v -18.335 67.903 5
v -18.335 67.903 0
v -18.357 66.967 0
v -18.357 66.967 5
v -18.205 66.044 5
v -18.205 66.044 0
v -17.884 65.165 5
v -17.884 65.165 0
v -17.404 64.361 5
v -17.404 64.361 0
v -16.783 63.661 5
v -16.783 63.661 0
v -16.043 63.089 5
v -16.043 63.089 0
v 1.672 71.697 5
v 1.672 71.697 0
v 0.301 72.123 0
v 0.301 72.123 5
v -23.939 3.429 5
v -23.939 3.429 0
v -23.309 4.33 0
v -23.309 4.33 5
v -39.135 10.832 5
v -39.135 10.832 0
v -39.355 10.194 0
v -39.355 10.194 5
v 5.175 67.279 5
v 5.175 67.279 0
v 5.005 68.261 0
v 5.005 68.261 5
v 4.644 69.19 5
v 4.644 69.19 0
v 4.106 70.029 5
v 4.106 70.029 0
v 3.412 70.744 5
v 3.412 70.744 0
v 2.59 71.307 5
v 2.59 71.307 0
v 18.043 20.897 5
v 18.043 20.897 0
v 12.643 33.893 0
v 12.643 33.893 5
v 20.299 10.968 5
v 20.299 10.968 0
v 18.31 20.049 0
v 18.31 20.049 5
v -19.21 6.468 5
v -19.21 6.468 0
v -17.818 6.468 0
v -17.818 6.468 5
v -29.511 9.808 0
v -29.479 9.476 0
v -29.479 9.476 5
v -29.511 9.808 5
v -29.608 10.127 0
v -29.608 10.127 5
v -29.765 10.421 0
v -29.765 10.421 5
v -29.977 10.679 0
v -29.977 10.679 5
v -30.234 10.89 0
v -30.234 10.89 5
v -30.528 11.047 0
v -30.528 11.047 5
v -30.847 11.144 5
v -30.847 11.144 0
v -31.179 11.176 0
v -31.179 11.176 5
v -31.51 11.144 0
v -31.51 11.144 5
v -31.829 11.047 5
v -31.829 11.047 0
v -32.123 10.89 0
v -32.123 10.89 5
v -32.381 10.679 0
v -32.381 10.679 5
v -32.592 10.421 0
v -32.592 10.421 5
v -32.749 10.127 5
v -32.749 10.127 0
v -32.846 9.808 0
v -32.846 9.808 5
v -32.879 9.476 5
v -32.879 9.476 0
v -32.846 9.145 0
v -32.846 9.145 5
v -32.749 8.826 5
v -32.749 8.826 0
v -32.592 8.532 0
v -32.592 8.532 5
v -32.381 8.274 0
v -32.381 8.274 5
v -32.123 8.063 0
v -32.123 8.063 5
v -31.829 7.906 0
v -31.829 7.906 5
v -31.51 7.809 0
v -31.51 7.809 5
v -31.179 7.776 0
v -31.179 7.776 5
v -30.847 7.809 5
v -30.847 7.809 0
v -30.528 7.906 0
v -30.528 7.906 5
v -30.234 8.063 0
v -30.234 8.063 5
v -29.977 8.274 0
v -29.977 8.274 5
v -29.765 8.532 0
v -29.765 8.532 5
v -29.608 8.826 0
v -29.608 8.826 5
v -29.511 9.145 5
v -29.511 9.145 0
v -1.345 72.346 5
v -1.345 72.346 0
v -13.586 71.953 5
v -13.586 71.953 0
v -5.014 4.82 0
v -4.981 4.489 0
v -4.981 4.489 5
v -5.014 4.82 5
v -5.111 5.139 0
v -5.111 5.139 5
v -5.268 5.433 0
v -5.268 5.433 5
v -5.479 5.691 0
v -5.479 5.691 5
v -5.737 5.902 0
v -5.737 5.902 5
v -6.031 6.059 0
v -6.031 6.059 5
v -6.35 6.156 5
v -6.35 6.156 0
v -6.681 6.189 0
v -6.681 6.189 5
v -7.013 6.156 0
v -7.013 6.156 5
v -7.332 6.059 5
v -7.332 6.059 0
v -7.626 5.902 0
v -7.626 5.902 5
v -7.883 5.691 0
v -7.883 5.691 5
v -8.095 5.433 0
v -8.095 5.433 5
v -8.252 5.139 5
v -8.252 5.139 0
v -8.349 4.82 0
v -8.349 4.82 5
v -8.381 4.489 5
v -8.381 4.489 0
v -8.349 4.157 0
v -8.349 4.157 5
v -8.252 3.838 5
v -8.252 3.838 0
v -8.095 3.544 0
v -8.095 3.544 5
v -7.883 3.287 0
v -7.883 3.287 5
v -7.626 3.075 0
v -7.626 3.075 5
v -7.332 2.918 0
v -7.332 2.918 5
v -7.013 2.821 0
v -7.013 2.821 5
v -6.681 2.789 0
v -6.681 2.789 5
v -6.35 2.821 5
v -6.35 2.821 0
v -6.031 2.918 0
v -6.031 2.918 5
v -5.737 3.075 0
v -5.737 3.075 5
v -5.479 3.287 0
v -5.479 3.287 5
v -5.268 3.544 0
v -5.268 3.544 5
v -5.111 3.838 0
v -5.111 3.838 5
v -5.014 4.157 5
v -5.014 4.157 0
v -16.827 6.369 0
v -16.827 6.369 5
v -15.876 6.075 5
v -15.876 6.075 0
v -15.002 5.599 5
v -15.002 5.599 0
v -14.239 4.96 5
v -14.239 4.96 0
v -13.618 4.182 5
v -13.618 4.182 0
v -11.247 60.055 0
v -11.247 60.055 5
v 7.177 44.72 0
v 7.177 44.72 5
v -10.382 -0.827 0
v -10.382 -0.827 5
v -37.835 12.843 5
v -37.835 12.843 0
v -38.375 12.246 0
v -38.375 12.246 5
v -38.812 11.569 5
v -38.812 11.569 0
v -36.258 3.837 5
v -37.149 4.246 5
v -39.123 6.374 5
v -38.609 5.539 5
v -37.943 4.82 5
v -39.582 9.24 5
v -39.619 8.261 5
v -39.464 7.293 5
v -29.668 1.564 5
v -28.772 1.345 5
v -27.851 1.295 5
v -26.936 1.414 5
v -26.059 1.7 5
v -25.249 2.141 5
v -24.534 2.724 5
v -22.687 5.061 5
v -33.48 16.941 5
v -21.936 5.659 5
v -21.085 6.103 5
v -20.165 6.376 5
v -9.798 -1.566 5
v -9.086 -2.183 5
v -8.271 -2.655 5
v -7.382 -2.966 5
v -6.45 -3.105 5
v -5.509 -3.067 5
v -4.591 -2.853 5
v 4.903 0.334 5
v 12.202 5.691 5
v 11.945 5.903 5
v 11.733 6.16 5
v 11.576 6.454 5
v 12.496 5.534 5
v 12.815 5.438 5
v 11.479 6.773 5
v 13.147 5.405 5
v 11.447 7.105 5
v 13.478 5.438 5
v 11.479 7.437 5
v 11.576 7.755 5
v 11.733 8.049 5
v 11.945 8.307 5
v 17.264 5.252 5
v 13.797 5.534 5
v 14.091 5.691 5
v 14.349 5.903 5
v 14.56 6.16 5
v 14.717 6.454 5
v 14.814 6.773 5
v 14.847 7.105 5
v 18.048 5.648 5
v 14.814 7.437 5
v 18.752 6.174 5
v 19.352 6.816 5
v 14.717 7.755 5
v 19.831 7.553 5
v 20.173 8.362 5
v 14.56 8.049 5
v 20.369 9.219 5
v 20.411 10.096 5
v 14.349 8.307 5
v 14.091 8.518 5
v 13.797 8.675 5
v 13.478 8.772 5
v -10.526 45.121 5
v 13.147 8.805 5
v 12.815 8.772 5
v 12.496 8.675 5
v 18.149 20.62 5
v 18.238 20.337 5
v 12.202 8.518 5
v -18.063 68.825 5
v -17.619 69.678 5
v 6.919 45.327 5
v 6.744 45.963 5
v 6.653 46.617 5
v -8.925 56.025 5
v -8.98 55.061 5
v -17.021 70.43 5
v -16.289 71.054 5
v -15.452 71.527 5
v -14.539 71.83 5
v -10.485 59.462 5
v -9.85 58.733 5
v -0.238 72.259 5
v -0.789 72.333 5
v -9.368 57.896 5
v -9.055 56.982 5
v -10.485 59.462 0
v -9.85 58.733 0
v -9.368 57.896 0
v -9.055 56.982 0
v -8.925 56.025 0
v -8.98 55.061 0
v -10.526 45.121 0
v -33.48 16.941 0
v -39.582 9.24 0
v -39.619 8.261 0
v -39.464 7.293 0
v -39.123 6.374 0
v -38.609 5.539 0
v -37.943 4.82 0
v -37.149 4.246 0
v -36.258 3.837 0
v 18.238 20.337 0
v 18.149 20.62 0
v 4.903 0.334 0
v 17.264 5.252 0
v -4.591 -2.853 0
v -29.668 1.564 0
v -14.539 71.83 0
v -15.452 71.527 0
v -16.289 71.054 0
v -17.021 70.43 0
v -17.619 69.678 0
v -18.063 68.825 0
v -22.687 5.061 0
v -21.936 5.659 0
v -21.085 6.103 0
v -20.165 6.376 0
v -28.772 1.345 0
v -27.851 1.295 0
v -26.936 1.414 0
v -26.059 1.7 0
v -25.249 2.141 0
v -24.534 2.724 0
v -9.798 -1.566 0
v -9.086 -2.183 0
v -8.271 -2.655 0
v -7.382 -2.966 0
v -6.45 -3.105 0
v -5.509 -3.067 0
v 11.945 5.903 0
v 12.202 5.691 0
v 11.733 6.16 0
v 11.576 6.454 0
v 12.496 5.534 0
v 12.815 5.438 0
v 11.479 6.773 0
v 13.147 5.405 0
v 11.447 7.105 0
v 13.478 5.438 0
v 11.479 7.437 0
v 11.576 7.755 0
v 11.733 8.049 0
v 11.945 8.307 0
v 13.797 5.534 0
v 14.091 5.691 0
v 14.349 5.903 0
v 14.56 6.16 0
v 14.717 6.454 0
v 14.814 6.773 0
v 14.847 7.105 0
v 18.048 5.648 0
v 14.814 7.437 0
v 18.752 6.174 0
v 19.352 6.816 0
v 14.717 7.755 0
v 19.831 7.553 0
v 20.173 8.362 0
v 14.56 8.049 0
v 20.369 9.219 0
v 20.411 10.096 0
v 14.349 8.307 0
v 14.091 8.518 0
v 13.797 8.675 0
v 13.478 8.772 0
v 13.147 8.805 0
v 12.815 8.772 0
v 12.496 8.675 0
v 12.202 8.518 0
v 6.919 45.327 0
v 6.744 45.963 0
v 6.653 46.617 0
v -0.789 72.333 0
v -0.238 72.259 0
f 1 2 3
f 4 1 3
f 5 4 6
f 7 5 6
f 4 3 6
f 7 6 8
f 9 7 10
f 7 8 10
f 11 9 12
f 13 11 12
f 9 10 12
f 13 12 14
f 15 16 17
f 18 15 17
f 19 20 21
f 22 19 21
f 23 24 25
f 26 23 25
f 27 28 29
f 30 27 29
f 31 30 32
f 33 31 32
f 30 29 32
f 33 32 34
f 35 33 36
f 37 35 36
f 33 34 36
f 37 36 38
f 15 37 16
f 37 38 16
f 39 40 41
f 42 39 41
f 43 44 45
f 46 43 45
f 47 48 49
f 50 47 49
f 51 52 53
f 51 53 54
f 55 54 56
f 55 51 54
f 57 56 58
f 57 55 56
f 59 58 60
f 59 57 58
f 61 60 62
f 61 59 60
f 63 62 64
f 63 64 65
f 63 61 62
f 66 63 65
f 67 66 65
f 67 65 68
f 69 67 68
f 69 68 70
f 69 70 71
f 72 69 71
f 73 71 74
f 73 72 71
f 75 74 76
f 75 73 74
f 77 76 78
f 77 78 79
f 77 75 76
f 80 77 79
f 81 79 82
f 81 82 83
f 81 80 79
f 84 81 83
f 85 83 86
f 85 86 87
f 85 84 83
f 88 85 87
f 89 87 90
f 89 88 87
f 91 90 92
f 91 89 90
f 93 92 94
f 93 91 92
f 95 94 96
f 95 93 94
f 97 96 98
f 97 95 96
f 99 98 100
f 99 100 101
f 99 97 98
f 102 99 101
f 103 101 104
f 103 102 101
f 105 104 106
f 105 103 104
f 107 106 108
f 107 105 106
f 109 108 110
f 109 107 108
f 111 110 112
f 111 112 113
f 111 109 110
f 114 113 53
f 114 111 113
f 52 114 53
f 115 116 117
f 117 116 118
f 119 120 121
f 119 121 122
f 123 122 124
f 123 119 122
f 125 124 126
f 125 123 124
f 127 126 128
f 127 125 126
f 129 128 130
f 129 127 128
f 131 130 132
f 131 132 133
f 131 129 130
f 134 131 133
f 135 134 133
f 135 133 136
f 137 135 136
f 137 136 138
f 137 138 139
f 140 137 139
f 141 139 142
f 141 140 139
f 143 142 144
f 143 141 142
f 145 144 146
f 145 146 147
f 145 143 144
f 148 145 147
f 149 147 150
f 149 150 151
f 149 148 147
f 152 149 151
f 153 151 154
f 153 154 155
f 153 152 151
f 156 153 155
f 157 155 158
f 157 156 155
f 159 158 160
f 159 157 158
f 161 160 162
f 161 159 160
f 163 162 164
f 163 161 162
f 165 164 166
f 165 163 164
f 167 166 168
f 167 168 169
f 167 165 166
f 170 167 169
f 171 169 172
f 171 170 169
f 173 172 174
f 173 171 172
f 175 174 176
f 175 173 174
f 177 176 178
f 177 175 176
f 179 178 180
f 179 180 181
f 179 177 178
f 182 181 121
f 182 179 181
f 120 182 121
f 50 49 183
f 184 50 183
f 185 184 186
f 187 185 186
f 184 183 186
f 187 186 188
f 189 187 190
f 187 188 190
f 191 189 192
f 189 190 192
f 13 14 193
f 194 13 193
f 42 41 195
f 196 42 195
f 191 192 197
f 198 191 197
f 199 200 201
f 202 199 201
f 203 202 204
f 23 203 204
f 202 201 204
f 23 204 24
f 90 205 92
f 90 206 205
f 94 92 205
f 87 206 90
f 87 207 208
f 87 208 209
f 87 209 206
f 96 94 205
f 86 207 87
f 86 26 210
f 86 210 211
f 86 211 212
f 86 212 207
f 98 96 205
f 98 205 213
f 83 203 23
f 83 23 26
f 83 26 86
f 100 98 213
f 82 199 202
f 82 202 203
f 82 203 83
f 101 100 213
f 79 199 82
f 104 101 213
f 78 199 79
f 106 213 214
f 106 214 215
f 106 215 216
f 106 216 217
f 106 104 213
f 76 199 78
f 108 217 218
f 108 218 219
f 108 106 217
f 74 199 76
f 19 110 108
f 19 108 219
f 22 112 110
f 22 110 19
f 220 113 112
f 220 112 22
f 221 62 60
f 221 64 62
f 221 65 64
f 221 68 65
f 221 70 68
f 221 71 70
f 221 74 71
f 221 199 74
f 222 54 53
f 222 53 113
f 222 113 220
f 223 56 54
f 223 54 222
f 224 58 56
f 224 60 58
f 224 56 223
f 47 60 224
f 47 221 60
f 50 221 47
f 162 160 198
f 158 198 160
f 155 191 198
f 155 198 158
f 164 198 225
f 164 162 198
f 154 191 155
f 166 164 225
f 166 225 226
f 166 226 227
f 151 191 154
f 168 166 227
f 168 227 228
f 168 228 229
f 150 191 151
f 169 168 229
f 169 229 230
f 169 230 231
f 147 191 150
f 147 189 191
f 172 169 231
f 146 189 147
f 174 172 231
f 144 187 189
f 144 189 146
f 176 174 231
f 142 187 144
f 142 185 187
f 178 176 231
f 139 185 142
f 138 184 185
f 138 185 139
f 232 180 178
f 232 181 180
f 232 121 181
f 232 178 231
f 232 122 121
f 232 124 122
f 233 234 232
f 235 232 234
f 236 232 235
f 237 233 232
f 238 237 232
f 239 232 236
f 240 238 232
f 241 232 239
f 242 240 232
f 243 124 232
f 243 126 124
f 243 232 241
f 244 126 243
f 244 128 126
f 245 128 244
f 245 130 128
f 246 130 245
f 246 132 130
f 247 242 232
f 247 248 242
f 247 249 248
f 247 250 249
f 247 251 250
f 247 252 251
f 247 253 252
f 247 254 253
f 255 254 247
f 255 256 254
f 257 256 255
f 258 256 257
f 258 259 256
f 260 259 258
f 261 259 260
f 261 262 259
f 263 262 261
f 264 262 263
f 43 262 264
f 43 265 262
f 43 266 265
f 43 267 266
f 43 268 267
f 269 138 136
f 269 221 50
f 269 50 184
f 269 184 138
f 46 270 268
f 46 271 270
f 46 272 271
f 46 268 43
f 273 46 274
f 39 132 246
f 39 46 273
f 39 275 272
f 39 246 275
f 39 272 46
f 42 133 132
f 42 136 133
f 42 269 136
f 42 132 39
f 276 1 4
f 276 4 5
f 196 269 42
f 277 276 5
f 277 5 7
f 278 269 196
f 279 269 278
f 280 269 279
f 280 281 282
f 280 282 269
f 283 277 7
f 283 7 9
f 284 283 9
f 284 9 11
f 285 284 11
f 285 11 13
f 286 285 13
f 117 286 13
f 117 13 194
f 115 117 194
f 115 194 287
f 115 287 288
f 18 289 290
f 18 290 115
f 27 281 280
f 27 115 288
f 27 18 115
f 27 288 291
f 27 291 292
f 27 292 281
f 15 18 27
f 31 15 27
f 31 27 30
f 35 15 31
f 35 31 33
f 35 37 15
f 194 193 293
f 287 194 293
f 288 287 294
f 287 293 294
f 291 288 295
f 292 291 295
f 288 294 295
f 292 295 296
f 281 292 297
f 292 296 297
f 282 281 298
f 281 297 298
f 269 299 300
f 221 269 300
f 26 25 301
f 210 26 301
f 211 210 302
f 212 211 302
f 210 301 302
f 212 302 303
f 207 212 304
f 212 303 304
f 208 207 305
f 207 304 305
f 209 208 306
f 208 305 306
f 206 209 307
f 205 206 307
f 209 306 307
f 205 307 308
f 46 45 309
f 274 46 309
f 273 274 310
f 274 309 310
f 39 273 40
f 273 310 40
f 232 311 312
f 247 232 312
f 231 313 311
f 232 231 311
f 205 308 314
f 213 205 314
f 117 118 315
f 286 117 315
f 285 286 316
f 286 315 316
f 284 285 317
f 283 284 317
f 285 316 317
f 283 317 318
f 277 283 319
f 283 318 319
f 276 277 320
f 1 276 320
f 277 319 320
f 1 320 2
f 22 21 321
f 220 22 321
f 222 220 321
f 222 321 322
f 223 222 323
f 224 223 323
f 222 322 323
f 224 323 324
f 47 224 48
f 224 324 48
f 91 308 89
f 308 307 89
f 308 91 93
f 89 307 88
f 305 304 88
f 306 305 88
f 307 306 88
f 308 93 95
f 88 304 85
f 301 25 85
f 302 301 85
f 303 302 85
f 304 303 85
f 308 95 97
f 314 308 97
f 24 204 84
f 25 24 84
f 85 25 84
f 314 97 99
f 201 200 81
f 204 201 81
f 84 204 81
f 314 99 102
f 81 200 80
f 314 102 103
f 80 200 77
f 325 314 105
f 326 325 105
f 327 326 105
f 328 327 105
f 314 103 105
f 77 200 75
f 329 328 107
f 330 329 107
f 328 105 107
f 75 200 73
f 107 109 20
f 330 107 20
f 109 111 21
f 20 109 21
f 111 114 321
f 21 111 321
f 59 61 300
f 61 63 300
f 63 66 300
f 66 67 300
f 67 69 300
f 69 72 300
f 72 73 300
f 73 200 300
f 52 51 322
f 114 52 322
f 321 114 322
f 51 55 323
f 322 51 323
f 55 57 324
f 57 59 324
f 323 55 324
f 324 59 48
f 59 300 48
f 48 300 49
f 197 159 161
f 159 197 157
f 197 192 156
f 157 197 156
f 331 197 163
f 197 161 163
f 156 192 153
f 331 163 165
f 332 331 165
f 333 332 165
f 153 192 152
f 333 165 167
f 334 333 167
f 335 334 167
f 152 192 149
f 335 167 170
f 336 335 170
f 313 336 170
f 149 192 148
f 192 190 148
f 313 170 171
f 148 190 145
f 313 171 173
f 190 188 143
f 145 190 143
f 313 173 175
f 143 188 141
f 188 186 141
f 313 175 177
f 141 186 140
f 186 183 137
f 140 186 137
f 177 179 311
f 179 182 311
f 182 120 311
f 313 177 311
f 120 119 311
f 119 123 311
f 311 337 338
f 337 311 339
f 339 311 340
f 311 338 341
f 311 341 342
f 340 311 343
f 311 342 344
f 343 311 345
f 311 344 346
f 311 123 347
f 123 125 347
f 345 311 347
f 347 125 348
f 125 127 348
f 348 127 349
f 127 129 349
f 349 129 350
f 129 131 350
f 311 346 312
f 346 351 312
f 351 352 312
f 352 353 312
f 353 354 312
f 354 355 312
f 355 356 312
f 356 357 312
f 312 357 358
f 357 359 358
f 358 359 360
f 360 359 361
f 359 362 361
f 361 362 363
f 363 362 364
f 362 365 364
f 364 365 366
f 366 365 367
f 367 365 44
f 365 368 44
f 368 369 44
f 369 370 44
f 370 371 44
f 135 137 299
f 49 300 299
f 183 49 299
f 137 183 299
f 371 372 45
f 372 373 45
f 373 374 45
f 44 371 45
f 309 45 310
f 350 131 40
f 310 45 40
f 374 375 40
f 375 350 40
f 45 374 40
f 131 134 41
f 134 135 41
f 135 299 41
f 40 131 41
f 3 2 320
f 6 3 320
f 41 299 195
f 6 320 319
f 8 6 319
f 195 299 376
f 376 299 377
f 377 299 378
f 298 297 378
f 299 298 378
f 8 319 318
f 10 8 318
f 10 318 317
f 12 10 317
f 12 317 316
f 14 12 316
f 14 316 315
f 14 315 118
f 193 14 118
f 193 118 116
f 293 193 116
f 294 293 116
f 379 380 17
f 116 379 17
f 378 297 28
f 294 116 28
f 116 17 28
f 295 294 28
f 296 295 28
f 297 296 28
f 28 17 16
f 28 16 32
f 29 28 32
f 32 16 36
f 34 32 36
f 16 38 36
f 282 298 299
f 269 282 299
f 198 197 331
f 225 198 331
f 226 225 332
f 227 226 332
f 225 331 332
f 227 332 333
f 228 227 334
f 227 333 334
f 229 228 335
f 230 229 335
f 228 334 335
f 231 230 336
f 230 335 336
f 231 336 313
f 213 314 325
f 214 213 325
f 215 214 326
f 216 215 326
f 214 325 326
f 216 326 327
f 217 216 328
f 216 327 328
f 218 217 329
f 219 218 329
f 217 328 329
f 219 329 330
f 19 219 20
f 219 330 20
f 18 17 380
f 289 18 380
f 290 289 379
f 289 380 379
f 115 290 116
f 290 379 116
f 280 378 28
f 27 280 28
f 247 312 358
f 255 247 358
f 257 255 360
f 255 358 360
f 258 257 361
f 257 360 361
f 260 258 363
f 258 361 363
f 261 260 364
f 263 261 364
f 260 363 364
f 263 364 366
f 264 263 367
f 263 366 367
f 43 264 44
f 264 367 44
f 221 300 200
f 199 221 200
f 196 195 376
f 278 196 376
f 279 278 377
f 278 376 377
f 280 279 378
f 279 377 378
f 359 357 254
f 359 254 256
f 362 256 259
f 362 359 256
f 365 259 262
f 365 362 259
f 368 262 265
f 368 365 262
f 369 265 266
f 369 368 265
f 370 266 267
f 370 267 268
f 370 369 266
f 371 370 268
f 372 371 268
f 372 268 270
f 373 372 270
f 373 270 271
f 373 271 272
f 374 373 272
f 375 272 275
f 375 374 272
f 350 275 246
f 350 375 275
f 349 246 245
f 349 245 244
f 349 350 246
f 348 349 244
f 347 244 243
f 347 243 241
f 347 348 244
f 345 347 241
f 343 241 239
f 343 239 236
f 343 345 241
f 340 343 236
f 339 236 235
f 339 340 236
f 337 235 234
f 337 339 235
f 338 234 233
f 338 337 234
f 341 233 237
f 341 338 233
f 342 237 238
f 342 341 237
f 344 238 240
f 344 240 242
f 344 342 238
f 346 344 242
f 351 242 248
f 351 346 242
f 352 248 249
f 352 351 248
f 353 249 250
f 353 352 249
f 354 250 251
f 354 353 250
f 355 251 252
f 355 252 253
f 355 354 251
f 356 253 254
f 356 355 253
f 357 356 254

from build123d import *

# Parameters (mm, degrees)
SKETCH1_R           = 1.7
BOSS_EXTRUDE1_DEPTH = 5


with BuildPart() as part:
    # Sketch1 → Boss-Extrude1 (new body)
    with BuildSketch(Plane.XY):
        with BuildLine():
            ThreePointArc((-37.834642703, 12.842889611), (-38.606977712, 11.916261554), (-39.134911245, 10.831629309))
            Line((-39.134911245, 10.831629309), (-39.354944681, 10.193532345))
            ThreePointArc((-39.354944681, 10.193532345), (-39.123029117, 6.373731812), (-36.25803319, 3.83671402))
            Line((-36.25803319, 3.83671402), (-29.668188839, 1.564353899))
            ThreePointArc((-29.668188839, 1.564353899), (-26.491164954, 1.536581811), (-23.938801839, 3.428589895))
            Line((-23.938801839, 3.428589895), (-23.309086795, 4.330374611))
            ThreePointArc((-23.309086795, 4.330374611), (-21.521238753, 5.901319007), (-19.20965321, 6.467745699))
            Line((-19.20965321, 6.467745699), (-17.817780351, 6.467745699))
            ThreePointArc((-17.817780351, 6.467745699), (-15.427188658, 5.859222826), (-13.618488855, 4.181774242))
            Line((-13.618488855, 4.181774242), (-10.381594688, -0.826523177))
            ThreePointArc((-10.381594688, -0.826523177), (-7.83372555, -2.83190182), (-4.59138835, -2.852641252))
            Line((-4.59138835, -2.852641252), (4.902899214, 0.333885288))
            Line((4.902899214, 0.333885288), (17.263606315, 5.252218218))
            ThreePointArc((17.263606315, 5.252218218), (19.830876998, 7.552622541), (20.299269541, 10.967786846))
            Line((20.299269541, 10.967786846), (18.310232366, 20.048547406))
            ThreePointArc((18.310232366, 20.048547406), (18.19566052, 20.478915648), (18.043247633, 20.897381709))
            Line((18.043247633, 20.897381709), (12.643097146, 33.892720517))
            Line((12.643097146, 33.892720517), (7.177182545, 44.720280021))
            ThreePointArc((7.177182545, 44.720280021), (6.821120261, 45.642450212), (6.653441068, 46.616648291))
            Line((6.653441068, 46.616648291), (5.174876069, 67.279164767))
            ThreePointArc((5.174876069, 67.279164767), (4.105623253, 70.028623013), (1.672465938, 71.696726041))
            Line((1.672465938, 71.696726041), (0.300566202, 72.123383215))
            ThreePointArc((0.300566202, 72.123383215), (-0.512819916, 72.303655469), (-1.344848079, 72.346366128))
            Line((-1.344848079, 72.346366128), (-13.585713544, 71.953043516))
            ThreePointArc((-13.585713544, 71.953043516), (-16.669785637, 70.75986422), (-18.33462528, 67.902682661))
            ThreePointArc((-18.33462528, 67.902682661), (-17.88389808, 65.164771828), (-16.042829318, 63.088771694))
            Line((-16.042829318, 63.088771694), (-11.247293049, 60.054506954))
            ThreePointArc((-11.247293049, 60.054506954), (-9.367982736, 57.896266905), (-8.980115504, 55.060889264))
            Line((-8.980115504, 55.060889264), (-10.526035755, 45.120570864))
            Line((-10.526035755, 45.120570864), (-33.479905595, 16.940953472))
            Line((-33.479905595, 16.940953472), (-37.834642703, 12.842889611))
        make_face()
        with Locations((-31.17879703, 9.476441992)):
            Circle(SKETCH1_R, mode=Mode.SUBTRACT)
        with Locations((-6.681396598, 4.488719859)):
            Circle(SKETCH1_R, mode=Mode.SUBTRACT)
        with Locations((13.146755278, 7.104898975)):
            Circle(SKETCH1_R, mode=Mode.SUBTRACT)
    extrude(amount=BOSS_EXTRUDE1_DEPTH)


solid = part.part
